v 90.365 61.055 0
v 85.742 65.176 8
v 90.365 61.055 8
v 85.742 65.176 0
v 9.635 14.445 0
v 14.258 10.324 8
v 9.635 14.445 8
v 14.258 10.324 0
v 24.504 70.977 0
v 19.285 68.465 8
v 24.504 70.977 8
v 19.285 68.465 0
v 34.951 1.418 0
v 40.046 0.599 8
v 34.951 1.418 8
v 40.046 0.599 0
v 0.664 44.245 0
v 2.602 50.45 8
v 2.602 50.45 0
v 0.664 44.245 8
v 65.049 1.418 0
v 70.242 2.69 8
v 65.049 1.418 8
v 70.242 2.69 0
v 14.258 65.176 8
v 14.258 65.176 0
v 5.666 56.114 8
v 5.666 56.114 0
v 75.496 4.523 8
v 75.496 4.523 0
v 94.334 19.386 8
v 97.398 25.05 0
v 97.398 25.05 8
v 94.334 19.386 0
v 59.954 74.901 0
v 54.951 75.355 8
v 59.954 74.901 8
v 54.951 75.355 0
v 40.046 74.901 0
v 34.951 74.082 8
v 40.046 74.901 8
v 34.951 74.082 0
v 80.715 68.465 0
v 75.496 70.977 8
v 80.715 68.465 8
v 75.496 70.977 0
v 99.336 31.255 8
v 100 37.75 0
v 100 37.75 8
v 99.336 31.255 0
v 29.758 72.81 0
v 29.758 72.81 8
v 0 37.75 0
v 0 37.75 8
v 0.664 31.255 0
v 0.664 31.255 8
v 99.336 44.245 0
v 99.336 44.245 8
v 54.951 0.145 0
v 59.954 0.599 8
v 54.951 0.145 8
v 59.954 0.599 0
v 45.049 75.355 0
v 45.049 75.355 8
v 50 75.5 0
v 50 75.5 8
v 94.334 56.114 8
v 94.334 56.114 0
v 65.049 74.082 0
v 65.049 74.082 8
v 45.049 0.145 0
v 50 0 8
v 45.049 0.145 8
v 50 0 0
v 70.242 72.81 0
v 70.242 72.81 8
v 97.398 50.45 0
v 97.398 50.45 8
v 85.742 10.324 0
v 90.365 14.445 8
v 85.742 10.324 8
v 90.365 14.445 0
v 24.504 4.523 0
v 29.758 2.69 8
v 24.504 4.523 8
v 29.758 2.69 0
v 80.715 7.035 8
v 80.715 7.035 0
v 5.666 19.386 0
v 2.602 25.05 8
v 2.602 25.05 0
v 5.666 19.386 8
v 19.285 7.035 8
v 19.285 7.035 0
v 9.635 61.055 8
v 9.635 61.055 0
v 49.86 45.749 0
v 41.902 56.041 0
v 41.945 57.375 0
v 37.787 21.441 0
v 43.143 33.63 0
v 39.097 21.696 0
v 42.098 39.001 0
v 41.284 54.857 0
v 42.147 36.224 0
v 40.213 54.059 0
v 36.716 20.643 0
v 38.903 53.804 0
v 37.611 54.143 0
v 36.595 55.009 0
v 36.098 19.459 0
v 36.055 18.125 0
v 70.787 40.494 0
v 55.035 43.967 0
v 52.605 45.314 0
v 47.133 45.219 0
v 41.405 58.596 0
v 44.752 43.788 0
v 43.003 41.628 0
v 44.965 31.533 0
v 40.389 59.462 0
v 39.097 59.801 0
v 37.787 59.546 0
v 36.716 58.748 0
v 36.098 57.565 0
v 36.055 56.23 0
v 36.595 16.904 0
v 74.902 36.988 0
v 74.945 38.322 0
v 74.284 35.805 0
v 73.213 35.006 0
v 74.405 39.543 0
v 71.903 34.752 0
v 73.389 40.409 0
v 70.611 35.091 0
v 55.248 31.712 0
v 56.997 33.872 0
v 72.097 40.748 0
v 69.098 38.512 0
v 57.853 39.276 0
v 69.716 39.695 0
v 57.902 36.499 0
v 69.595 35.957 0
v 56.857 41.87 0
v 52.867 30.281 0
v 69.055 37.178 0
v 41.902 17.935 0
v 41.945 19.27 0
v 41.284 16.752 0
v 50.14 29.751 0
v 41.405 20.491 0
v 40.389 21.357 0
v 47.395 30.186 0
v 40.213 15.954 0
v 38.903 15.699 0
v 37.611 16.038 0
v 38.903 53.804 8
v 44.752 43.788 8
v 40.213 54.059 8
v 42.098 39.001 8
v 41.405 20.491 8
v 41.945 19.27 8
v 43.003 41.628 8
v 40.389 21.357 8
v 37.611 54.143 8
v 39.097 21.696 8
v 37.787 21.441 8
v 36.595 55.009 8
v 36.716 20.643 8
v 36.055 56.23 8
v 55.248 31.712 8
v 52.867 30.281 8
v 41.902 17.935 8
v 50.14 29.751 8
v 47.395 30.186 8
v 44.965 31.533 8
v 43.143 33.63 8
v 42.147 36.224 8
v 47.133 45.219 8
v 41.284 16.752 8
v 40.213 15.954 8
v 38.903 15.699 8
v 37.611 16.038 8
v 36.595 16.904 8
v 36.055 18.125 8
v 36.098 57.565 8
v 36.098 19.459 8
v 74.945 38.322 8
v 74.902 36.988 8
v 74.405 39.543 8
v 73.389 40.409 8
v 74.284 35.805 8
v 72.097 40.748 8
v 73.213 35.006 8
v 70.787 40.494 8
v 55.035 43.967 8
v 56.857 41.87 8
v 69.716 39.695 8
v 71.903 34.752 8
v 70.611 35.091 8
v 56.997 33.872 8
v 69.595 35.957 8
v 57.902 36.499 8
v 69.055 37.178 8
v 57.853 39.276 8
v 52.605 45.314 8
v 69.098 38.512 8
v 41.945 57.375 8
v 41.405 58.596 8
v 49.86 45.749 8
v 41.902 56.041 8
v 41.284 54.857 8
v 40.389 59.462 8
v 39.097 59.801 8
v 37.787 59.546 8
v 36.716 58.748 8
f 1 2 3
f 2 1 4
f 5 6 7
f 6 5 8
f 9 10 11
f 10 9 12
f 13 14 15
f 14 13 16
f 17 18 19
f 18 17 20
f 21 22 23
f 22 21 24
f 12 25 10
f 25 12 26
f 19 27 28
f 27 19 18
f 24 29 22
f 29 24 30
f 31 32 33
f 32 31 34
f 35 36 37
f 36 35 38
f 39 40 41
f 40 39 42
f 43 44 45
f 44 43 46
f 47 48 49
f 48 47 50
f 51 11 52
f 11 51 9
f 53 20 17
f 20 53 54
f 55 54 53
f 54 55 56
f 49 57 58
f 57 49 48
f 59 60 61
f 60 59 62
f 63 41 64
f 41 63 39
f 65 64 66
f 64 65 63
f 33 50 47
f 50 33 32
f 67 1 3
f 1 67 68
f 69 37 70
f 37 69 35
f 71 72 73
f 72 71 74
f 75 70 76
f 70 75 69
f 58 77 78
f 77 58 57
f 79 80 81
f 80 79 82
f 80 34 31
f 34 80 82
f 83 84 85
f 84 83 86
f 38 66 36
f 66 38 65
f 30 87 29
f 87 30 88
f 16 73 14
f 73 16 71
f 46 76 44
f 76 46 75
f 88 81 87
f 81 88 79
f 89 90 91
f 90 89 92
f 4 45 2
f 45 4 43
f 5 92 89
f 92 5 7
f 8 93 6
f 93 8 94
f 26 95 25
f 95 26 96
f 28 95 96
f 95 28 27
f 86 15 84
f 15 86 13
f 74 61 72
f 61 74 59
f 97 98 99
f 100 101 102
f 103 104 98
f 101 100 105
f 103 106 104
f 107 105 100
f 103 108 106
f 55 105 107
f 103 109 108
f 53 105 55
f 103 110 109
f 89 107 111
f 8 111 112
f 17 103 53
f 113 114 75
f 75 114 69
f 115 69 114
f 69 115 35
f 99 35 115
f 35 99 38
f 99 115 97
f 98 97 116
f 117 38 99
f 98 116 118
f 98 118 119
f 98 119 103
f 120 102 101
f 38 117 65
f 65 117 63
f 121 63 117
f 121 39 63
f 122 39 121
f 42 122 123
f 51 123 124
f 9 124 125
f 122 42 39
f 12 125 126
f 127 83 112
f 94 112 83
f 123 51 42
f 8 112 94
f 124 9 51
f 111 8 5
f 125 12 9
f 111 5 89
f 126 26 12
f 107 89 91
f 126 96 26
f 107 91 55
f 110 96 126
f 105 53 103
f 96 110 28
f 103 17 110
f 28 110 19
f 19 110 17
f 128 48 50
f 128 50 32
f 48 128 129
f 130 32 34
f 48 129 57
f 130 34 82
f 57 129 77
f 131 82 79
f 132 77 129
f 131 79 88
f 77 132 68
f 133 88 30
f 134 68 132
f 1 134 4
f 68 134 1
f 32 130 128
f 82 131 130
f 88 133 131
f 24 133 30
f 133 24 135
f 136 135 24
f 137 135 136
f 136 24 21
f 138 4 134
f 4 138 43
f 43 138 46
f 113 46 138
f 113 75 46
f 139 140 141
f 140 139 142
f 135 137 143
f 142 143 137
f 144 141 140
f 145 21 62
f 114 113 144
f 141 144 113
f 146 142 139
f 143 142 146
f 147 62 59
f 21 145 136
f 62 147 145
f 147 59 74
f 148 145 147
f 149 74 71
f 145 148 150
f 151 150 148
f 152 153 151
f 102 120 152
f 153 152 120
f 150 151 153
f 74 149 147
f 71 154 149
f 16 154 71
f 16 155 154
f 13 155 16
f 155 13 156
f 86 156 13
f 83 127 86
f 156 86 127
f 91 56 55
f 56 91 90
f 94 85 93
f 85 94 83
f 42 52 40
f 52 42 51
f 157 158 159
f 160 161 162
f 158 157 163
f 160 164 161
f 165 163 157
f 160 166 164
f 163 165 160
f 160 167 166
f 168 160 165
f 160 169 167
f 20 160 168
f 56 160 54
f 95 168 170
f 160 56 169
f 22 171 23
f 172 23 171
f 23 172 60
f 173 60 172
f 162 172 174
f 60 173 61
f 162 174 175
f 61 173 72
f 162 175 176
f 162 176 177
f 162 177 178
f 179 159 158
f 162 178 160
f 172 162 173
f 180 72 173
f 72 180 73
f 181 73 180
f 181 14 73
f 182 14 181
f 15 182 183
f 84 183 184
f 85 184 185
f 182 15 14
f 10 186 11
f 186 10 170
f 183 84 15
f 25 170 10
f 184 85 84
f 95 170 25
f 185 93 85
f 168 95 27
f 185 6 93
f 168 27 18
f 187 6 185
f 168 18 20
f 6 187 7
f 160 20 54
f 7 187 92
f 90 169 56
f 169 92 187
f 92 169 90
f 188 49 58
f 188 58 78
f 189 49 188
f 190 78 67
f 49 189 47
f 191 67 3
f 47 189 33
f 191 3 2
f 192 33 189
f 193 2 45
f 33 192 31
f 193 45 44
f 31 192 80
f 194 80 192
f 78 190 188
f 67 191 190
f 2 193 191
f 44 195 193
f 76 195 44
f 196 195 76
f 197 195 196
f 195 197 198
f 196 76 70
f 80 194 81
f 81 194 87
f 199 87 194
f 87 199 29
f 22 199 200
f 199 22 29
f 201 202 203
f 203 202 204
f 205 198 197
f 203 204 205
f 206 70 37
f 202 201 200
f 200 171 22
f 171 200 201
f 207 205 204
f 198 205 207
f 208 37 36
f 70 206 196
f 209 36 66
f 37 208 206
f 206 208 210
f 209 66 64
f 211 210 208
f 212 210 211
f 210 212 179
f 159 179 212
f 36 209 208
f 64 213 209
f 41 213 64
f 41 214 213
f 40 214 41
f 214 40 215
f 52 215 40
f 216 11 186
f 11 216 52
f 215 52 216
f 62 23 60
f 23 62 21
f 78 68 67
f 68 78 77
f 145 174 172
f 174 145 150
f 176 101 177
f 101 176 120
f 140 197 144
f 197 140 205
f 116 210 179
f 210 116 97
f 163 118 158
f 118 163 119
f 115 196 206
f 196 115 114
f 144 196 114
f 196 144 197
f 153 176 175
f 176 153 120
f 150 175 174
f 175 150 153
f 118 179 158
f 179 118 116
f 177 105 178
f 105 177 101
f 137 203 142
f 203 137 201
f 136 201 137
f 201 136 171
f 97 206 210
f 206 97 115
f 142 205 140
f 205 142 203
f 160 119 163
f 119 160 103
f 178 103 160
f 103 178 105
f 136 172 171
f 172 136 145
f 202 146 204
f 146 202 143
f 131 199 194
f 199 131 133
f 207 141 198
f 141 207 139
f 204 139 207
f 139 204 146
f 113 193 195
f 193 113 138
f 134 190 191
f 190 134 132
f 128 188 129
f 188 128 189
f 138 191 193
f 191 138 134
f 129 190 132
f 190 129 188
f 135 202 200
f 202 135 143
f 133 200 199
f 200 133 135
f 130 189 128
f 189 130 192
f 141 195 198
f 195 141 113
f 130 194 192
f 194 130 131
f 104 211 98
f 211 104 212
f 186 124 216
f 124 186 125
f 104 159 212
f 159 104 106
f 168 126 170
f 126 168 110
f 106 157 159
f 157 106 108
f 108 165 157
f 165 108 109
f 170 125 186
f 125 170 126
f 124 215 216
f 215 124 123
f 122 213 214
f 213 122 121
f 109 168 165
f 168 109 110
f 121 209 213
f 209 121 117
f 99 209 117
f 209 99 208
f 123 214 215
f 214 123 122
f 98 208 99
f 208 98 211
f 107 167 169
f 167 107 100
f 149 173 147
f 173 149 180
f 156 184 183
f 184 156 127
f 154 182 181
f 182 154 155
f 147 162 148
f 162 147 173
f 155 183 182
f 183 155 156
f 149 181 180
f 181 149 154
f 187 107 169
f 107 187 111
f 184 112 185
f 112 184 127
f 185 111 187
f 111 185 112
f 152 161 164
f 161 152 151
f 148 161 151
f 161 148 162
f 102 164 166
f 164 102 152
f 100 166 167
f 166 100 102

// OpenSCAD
$fn = 32;

// ----------------------------------------------------------------------
// Cam plate: double_lobe cam, base R36
// ----------------------------------------------------------------------

// --- parameters (mm) ---
base_r = 36;              // base circle radius
lobe_h = 14;              // cam lobe rise
bore_r = 8;               // shaft bore radius
plate_t = 8;              // plate thickness, Z (extrusion height)
ring_r = 22;              // lightening ring radius
bolt_r = 3;               // lightening hole radius

profile = [[100, 37.75], [99.336, 44.245], [97.398, 50.45], [94.334, 56.114], [90.365, 61.055], [85.742, 65.176], [80.715, 68.465], [75.496, 70.977], [70.242, 72.81], [65.049, 74.082], [59.954, 74.901], [54.951, 75.355], [50, 75.5], [45.049, 75.355], [40.046, 74.901], [34.951, 74.082], [29.758, 72.81], [24.504, 70.977], [19.285, 68.465], [14.258, 65.176], [9.635, 61.055], [5.666, 56.114], [2.602, 50.45], [0.664, 44.245], [0, 37.75], [0.664, 31.255], [2.602, 25.05], [5.666, 19.386], [9.635, 14.445], [14.258, 10.324], [19.285, 7.035], [24.504, 4.523], [29.758, 2.69], [34.951, 1.418], [40.046, 0.599], [45.049, 0.145], [50, 0], [54.951, 0.145], [59.954, 0.599], [65.049, 1.418], [70.242, 2.69], [75.496, 4.523], [80.715, 7.035], [85.742, 10.324], [90.365, 14.445], [94.334, 19.386], [97.398, 25.05], [99.336, 31.255]];  // primary outline, 48 points, counter clockwise
void_1 = [[57.853, 39.276], [56.857, 41.87], [55.035, 43.967], [52.605, 45.314], [49.86, 45.749], [47.133, 45.219], [44.752, 43.788], [43.003, 41.628], [42.098, 39.001], [42.147, 36.224], [43.143, 33.63], [44.965, 31.533], [47.395, 30.186], [50.14, 29.751], [52.867, 30.281], [55.248, 31.712], [56.997, 33.872], [57.902, 36.499]];  // shaft bore, 18 points
void_2 = [[74.945, 38.322], [74.405, 39.543], [73.389, 40.409], [72.097, 40.748], [70.787, 40.494], [69.716, 39.695], [69.098, 38.512], [69.055, 37.178], [69.595, 35.957], [70.611, 35.091], [71.903, 34.752], [73.213, 35.006], [74.284, 35.805], [74.902, 36.988]];  // lightening hole 1, 14 points
void_3 = [[41.945, 57.375], [41.405, 58.596], [40.389, 59.462], [39.097, 59.801], [37.787, 59.546], [36.716, 58.748], [36.098, 57.565], [36.055, 56.23], [36.595, 55.009], [37.611, 54.143], [38.903, 53.804], [40.213, 54.059], [41.284, 54.857], [41.902, 56.041]];  // lightening hole 2, 14 points
void_4 = [[41.945, 19.27], [41.405, 20.491], [40.389, 21.357], [39.097, 21.696], [37.787, 21.441], [36.716, 20.643], [36.098, 19.459], [36.055, 18.125], [36.595, 16.904], [37.611, 16.038], [38.903, 15.699], [40.213, 15.954], [41.284, 16.752], [41.902, 17.935]];  // lightening hole 3, 14 points

// --- the one profile operation ---
difference() {
  linear_extrude(height = plate_t) polygon(points = profile);
  translate([0, 0, -1])
    linear_extrude(height = plate_t + 2) polygon(points = void_1);
  translate([0, 0, -1])
    linear_extrude(height = plate_t + 2) polygon(points = void_2);
  translate([0, 0, -1])
    linear_extrude(height = plate_t + 2) polygon(points = void_3);
  translate([0, 0, -1])
    linear_extrude(height = plate_t + 2) polygon(points = void_4);
}
